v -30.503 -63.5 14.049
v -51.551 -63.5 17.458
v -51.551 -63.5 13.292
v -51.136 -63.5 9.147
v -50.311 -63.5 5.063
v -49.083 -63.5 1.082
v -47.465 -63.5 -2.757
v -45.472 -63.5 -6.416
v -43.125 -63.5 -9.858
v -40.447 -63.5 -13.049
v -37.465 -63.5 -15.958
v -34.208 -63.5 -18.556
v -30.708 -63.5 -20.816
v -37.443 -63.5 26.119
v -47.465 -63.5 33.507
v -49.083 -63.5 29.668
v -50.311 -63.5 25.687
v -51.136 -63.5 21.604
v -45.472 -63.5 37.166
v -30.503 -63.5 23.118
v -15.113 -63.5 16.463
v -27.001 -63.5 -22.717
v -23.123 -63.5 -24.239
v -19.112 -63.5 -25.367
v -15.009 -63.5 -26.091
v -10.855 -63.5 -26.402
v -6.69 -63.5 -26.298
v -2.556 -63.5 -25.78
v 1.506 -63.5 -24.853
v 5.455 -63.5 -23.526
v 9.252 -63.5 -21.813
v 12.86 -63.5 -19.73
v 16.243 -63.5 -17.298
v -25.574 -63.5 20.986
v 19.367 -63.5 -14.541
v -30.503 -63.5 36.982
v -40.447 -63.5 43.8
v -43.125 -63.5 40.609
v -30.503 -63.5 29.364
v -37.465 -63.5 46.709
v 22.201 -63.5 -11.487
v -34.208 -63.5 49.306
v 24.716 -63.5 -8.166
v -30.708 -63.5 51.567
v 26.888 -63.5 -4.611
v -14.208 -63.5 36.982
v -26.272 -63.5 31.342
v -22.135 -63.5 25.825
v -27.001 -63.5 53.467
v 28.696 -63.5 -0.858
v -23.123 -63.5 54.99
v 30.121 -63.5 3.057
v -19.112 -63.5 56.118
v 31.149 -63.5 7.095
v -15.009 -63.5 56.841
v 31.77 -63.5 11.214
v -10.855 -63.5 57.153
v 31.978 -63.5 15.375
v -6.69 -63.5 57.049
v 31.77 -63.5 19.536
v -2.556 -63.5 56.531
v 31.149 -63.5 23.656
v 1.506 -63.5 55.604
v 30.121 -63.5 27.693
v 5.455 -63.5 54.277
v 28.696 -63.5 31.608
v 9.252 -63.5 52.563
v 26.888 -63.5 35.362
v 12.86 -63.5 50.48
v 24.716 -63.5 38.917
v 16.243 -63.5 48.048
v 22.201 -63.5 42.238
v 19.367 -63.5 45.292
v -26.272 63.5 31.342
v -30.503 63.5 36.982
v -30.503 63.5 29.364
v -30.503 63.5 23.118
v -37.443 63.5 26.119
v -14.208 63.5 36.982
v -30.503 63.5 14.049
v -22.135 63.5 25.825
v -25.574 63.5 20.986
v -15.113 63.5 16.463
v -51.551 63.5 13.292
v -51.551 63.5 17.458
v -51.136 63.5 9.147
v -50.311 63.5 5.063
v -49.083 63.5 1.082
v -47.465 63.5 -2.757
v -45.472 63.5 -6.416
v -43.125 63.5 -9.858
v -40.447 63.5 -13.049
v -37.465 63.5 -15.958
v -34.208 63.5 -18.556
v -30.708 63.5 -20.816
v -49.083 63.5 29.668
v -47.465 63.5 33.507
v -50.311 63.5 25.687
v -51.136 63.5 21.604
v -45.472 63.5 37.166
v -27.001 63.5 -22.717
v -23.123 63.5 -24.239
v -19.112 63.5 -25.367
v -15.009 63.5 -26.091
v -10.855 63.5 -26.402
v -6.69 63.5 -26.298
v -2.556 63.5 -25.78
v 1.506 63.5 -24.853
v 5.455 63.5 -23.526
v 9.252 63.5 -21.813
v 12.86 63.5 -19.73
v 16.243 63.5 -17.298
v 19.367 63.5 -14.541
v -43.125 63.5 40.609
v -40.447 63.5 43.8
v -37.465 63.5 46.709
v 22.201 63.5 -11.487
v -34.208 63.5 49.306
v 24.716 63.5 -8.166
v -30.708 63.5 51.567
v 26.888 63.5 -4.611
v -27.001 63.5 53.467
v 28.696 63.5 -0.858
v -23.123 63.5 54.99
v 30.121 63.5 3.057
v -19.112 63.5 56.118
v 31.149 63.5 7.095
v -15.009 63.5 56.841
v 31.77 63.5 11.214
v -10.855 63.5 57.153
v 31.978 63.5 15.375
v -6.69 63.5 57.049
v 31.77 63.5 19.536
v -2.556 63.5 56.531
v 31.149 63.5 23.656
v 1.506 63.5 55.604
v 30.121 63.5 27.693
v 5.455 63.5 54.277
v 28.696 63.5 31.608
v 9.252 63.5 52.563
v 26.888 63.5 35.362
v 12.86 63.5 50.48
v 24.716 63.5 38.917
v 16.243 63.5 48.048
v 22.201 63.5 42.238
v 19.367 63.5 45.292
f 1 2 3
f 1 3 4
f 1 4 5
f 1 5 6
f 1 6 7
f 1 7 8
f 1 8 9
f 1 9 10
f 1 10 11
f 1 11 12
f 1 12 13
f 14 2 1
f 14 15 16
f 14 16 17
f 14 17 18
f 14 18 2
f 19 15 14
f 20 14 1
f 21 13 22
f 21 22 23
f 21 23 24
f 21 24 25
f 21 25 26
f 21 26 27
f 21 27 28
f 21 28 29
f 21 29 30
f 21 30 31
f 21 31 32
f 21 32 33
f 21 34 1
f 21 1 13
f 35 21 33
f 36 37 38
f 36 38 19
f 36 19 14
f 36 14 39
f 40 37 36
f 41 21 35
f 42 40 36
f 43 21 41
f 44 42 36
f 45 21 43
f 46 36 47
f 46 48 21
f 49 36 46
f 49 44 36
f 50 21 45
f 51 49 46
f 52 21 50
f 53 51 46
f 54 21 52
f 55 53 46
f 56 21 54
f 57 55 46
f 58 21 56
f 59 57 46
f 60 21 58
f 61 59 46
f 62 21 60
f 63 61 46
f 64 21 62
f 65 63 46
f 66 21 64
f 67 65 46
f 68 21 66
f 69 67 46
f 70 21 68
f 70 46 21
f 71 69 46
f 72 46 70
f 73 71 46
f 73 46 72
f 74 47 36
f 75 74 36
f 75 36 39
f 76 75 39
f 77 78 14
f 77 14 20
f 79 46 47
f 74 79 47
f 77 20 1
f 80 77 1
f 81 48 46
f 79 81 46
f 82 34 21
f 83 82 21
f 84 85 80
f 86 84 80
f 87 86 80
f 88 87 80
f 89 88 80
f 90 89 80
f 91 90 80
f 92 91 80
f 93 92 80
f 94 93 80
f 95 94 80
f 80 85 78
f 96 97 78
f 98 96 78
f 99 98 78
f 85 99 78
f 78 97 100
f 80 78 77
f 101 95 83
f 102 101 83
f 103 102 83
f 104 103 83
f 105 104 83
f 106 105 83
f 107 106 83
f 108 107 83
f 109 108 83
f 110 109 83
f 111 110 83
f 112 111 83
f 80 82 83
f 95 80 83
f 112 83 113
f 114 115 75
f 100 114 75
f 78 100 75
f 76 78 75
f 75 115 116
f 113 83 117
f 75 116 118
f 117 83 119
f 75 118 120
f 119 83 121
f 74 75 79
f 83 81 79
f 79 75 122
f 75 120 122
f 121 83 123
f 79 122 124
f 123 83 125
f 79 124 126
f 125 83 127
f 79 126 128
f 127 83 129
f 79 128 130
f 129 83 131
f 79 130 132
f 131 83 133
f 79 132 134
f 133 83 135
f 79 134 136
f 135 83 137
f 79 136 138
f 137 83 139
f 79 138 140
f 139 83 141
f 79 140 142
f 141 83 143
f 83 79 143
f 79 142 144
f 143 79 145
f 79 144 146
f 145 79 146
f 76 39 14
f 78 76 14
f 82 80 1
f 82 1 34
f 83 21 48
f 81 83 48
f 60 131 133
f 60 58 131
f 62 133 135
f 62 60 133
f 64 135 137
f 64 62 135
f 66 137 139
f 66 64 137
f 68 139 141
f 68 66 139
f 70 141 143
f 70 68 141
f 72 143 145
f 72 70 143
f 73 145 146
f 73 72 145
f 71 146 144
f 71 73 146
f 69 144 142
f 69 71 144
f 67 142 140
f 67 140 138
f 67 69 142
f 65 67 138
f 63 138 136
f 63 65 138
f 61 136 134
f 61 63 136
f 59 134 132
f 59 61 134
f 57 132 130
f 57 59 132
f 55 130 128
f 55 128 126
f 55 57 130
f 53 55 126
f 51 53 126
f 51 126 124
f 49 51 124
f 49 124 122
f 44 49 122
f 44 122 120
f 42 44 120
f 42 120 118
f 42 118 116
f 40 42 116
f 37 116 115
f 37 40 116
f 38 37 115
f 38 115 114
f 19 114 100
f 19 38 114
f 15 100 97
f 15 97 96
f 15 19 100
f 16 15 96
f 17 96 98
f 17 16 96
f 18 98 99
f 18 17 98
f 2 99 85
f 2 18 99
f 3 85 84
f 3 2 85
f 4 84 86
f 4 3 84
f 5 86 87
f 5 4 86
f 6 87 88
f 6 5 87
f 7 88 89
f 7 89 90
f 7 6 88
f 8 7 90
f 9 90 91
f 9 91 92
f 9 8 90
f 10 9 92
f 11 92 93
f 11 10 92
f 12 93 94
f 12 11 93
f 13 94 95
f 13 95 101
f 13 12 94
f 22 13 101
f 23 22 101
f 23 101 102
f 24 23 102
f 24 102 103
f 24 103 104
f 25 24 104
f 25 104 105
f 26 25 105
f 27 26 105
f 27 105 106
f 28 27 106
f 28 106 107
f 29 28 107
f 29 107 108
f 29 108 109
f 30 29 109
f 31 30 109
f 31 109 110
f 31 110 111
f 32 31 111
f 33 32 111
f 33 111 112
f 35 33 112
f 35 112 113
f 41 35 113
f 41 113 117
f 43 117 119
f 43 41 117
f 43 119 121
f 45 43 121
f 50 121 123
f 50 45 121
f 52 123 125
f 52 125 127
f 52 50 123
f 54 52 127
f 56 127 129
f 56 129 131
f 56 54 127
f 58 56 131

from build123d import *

# Parameters (mm, degrees)
F0_R     = 41.7904194507
F1_DEPTH = 63.5
F3_DEPTH = 127.001


with BuildPart() as f1:
    # F0 (on Front) → F1 (new body, symmetric)
    with BuildSketch(Plane.XZ):
        with Locations((-9.8128121016, 15.3752699469)):
            Circle(F0_R)
    extrude(amount=F1_DEPTH, both=True)

    # F2 (on face) → F3 (cut, through all)
    with BuildSketch(Plane.XZ.offset(63.5)):
        Polygon((-25.5735145776, 20.9861662898), (-15.1132475585, 16.4628084749), (-22.1351497328, 25.825347257), align=None)
        Polygon((-30.5027123541, 14.048775658), (-25.5735145776, 20.9861662898), (-30.5027123541, 23.1177108519), align=None)
        Polygon((-30.5027123541, 23.1177108519), (-25.5735145776, 20.9861662898), (-22.1351497328, 25.825347257), (-26.2723503194, 31.341616208), (-30.5027123541, 29.3637841009), align=None)
        Polygon((-26.2723503194, 31.341616208), (-22.1351497328, 25.825347257), (-14.2079843208, 36.982100457), align=None)
        Polygon((-37.4430641532, 26.1189434677), (-30.5027123541, 23.1177108519), (-30.5027123541, 29.3637841009), align=None)
        Polygon((-30.5027123541, 29.3637841009), (-26.2723503194, 31.341616208), (-30.5027123541, 36.982100457), align=None)
    extrude(amount=-F3_DEPTH, mode=Mode.SUBTRACT)


solid = f1.part
